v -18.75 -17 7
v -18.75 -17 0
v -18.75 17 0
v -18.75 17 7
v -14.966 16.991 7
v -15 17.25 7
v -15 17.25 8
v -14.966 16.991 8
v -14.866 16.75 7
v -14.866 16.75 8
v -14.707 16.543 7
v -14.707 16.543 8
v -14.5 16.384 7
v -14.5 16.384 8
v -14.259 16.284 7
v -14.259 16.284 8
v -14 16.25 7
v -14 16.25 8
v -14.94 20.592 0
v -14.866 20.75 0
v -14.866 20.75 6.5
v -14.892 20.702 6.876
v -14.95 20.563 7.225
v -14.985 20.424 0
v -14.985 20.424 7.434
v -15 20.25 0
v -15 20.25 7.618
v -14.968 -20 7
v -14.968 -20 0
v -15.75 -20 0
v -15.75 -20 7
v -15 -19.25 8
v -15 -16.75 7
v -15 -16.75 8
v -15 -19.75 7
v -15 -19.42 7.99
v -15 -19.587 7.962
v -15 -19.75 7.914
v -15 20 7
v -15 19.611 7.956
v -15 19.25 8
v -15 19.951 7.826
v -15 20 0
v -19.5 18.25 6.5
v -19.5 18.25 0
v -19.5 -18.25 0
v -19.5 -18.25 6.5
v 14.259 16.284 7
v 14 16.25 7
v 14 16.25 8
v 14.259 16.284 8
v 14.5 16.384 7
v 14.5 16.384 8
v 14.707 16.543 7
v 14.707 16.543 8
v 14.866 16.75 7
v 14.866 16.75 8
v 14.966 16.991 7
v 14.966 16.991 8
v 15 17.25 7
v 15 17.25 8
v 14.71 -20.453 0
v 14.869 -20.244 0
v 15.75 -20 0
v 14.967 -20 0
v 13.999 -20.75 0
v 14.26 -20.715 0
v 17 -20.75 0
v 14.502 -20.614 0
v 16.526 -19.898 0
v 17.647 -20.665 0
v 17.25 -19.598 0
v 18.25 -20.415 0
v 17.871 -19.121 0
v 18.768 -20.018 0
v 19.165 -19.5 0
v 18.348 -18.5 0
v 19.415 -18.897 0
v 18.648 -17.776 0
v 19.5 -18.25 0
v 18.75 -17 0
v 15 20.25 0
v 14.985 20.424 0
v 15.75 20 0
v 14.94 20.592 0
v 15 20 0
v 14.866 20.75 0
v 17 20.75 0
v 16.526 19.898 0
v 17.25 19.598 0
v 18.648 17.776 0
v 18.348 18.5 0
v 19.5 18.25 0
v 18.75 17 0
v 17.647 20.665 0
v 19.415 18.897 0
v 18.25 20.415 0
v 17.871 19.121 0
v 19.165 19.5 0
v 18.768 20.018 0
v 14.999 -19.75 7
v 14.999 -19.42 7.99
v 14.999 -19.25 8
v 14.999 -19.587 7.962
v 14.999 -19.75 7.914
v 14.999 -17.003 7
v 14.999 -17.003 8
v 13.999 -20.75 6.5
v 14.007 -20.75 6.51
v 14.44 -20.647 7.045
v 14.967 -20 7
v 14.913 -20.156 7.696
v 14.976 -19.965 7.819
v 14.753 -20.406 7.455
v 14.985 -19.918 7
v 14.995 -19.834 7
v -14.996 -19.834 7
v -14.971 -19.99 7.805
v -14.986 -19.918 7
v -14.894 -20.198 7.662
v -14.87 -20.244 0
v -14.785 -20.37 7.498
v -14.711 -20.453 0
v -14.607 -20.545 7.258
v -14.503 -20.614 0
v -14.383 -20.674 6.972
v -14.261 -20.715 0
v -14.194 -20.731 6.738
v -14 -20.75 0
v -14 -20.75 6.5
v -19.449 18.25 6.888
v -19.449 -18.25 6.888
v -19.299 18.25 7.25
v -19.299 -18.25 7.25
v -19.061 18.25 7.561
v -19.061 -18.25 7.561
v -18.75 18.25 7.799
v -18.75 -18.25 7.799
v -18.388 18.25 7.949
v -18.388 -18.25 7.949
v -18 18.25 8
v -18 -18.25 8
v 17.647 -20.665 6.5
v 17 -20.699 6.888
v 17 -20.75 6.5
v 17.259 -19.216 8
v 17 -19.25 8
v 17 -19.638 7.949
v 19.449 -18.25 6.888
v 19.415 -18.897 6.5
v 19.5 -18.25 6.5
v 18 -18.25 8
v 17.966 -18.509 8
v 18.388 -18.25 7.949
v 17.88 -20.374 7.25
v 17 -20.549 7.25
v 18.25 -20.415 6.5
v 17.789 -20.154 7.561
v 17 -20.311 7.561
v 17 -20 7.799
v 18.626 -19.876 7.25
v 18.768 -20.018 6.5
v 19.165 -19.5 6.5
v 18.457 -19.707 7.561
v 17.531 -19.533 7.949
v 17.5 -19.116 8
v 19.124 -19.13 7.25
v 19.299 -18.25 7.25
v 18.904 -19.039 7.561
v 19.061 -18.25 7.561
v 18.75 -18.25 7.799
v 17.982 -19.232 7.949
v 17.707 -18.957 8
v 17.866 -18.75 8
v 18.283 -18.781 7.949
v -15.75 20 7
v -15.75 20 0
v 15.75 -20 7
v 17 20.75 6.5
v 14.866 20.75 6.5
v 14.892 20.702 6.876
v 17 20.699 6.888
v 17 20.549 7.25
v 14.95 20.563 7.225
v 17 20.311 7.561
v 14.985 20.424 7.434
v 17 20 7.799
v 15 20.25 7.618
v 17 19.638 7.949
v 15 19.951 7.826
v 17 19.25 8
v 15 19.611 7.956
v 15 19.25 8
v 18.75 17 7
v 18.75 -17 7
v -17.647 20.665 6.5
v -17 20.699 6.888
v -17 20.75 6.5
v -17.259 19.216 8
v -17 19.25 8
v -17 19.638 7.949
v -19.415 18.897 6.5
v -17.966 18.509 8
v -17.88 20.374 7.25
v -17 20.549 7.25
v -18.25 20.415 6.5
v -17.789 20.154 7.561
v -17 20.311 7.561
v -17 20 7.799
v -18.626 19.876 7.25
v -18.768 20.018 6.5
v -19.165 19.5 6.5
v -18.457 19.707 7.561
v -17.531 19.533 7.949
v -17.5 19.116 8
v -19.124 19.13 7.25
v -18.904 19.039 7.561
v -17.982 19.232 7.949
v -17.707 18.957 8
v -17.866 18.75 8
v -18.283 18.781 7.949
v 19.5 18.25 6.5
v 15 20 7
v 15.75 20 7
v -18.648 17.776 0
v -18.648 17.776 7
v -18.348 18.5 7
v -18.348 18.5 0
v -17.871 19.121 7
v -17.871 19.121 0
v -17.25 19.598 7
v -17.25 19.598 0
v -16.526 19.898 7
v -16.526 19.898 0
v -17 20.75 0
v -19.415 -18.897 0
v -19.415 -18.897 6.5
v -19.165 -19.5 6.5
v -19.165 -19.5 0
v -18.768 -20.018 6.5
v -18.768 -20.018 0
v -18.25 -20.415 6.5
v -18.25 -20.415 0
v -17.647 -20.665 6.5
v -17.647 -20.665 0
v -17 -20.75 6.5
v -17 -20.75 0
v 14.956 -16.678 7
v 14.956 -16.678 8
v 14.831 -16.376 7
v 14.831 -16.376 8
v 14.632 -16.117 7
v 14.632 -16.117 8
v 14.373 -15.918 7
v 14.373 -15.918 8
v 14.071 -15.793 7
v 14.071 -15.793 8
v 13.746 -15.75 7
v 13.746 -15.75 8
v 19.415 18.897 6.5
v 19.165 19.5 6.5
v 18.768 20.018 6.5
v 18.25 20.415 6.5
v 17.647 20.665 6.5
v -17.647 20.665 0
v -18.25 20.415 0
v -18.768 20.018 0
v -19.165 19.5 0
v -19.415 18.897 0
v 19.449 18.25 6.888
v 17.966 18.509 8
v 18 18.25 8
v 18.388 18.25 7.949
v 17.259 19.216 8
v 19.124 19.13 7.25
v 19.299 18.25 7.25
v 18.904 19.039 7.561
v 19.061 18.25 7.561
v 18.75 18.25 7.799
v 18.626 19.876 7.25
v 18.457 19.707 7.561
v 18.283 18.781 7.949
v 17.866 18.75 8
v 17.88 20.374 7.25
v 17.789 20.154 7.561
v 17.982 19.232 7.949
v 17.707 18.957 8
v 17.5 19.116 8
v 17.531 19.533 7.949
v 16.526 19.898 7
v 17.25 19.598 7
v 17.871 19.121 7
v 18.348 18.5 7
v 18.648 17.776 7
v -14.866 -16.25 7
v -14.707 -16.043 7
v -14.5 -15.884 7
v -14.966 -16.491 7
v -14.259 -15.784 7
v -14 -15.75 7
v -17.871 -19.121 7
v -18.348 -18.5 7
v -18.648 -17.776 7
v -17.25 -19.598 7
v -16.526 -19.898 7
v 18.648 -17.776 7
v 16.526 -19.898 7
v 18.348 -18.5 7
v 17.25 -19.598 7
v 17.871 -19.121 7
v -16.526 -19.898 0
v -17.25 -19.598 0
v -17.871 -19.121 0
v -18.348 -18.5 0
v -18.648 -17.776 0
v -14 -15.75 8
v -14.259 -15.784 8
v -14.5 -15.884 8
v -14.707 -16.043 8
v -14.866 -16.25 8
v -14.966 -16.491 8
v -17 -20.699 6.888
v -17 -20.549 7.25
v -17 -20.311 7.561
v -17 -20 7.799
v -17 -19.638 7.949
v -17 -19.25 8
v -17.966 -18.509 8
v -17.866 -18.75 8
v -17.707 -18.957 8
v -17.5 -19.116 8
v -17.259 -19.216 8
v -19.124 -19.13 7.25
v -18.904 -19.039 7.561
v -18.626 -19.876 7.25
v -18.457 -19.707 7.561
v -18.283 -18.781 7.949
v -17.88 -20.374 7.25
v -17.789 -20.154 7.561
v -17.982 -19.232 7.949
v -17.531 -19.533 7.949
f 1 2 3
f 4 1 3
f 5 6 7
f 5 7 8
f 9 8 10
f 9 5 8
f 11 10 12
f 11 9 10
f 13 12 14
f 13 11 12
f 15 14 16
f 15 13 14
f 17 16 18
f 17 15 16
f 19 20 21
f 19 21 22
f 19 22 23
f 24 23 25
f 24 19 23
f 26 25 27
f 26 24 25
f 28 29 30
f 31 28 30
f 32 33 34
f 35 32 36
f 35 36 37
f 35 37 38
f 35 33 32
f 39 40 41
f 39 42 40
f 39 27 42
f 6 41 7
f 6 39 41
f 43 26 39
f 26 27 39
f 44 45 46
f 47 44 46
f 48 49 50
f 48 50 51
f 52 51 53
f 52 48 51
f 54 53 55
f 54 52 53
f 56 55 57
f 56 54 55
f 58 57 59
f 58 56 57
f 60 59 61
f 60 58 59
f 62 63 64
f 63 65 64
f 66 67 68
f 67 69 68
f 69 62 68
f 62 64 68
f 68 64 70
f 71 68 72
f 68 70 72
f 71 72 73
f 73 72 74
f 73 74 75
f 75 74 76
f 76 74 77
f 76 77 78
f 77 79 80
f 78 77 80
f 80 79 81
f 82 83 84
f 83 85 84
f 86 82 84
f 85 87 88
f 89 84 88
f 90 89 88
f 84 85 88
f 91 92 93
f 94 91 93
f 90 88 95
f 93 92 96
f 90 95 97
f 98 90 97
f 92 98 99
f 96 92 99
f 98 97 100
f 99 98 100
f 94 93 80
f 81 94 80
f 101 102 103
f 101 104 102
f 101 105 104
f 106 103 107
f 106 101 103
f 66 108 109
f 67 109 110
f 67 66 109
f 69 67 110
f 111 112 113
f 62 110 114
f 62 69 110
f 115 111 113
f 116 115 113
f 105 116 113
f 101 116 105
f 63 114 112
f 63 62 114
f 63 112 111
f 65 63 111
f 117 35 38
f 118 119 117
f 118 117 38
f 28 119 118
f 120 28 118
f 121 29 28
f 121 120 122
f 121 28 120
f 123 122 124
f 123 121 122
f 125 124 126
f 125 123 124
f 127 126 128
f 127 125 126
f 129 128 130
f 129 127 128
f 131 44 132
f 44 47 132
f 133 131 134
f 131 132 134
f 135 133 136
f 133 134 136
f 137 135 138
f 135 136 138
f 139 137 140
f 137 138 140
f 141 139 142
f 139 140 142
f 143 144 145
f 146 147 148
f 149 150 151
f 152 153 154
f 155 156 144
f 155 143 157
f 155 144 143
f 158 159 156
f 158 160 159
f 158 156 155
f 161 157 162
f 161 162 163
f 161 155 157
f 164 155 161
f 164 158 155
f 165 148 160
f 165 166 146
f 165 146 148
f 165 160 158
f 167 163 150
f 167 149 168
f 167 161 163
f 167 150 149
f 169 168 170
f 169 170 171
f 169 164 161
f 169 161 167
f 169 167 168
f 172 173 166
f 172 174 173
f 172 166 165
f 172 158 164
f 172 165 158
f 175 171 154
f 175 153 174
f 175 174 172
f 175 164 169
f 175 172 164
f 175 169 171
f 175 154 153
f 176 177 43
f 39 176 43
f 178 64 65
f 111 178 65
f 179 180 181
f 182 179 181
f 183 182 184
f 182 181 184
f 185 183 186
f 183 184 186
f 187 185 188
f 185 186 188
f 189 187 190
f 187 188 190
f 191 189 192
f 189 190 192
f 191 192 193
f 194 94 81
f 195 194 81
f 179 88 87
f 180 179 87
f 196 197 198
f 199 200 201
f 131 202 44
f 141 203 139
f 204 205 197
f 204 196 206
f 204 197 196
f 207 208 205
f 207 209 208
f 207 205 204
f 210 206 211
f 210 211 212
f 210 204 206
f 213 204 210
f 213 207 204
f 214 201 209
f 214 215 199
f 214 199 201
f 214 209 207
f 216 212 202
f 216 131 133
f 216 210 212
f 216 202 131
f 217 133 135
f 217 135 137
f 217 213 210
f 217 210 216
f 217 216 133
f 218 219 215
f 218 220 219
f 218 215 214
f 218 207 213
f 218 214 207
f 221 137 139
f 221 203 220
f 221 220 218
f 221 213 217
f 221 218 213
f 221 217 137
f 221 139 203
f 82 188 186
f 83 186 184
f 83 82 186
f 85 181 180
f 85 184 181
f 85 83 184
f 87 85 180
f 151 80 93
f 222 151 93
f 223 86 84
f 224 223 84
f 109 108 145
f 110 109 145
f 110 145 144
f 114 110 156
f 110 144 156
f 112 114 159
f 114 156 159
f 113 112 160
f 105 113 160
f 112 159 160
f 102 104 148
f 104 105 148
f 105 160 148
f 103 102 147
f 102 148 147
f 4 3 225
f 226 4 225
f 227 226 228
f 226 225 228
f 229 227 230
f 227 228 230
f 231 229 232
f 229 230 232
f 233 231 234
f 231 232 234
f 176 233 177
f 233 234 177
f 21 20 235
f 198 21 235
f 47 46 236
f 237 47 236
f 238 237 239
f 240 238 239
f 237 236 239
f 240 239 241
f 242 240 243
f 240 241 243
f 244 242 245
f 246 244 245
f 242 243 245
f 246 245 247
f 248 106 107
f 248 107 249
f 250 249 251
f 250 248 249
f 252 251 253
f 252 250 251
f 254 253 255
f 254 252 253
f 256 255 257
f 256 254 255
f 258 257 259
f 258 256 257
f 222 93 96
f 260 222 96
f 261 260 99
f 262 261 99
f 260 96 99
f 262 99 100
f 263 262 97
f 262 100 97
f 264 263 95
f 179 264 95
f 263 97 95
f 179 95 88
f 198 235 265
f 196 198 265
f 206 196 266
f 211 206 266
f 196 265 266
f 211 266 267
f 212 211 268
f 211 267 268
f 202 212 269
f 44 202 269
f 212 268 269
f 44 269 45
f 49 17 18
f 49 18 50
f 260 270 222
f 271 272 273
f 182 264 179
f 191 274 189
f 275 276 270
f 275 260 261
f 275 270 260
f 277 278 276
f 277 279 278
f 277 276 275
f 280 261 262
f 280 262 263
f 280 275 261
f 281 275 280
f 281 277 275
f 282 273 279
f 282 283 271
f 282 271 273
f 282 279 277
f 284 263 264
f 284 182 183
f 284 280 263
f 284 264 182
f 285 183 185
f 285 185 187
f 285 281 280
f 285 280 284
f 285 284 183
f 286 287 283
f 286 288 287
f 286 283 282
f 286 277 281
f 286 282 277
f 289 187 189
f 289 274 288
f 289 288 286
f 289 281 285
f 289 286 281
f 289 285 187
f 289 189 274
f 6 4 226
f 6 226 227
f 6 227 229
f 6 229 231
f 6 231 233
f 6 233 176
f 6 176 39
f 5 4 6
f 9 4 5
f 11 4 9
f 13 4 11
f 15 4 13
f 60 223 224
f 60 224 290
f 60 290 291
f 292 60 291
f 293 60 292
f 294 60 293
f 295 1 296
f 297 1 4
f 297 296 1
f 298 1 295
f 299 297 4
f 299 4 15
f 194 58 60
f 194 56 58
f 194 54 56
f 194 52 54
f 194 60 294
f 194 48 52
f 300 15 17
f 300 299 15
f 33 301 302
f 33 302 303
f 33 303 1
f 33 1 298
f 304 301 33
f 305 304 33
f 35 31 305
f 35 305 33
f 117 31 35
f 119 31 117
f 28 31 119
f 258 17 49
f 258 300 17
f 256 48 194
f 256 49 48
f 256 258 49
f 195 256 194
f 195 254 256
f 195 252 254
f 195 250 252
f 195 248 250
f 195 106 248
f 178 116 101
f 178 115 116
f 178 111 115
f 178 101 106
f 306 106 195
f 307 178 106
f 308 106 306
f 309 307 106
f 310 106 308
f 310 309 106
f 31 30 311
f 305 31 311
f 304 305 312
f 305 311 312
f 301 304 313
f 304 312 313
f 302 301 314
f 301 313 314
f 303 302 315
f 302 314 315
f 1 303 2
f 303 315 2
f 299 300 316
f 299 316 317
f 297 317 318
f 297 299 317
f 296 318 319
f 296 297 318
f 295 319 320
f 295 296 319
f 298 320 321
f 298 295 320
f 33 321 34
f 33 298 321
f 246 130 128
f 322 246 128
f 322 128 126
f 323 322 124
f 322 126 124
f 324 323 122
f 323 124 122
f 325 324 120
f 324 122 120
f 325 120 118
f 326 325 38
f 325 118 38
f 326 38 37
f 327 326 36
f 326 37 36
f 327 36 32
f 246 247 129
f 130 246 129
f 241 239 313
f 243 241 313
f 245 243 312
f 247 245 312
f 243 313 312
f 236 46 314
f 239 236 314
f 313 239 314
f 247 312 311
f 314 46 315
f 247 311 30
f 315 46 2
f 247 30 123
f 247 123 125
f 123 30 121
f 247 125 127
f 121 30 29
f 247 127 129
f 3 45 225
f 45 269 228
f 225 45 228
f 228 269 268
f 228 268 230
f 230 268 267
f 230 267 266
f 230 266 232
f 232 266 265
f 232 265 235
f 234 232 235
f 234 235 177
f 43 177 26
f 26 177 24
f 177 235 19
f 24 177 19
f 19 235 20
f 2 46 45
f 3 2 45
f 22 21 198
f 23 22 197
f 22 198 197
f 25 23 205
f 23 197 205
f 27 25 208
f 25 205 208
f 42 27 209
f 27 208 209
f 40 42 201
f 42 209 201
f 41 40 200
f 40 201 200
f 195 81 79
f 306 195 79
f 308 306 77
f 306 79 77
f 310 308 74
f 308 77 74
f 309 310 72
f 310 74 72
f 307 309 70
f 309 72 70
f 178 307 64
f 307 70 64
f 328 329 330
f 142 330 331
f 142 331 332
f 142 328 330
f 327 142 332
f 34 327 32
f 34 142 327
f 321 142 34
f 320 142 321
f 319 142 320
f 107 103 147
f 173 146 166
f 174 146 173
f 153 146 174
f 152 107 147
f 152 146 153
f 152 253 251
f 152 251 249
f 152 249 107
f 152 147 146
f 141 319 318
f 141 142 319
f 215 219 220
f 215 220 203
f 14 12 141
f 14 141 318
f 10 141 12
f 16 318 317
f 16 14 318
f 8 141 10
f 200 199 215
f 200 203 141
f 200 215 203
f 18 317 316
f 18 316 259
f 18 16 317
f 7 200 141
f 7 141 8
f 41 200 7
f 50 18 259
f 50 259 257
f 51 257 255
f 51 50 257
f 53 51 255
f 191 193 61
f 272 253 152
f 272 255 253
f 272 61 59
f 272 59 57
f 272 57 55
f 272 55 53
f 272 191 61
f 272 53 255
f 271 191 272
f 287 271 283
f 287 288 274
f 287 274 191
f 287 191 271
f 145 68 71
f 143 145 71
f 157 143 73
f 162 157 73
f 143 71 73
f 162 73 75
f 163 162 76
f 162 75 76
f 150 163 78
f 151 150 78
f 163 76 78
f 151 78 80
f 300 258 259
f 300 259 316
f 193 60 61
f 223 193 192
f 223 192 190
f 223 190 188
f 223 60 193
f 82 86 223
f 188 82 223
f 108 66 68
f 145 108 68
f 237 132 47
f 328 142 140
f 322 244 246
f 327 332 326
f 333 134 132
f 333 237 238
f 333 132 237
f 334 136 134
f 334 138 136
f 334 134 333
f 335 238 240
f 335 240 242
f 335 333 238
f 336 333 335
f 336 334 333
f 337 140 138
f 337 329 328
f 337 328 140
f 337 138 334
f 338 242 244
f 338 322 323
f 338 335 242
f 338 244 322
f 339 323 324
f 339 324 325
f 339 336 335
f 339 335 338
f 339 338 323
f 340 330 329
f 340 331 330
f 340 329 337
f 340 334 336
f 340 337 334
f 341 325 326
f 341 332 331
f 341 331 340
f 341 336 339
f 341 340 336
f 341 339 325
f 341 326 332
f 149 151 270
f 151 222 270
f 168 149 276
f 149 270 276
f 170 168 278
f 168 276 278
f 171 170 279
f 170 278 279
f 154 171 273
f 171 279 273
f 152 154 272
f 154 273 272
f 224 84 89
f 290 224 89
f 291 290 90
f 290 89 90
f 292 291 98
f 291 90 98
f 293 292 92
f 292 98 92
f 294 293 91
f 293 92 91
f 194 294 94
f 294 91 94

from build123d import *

# Parameters (mm, degrees)
PAD_DEPTH       = 8
FILLET_R        = 1.5
POCKET_DEPTH    = 7
POCKET001_DEPTH = 10
POCKET002_DEPTH = 10


with BuildPart() as part:
    # Sketch → Pad (new body)
    with BuildSketch(Plane.XY):
        with BuildLine():
            Line((-19.5, 18.25), (-19.5, -18.25))
            ThreePointArc((-19.5, -18.25), (-18.767767, -20.017767), (-17, -20.75))
            Line((-17, -20.75), (17, -20.75))
            ThreePointArc((17, -20.75), (18.767767, -20.017767), (19.5, -18.25))
            Line((19.5, -18.25), (19.5, 18.25))
            ThreePointArc((19.5, 18.25), (18.767767, 20.017767), (17, 20.75))
            Line((17, 20.75), (-17, 20.75))
            ThreePointArc((-17, 20.75), (-18.767767, 20.017767), (-19.5, 18.25))
        make_face()
    extrude(amount=PAD_DEPTH)

    # Fillet
    fillet_edges = [part.edges().sort_by_distance(p)[0] for p in [
        (-19.5, 0, 8),
        (-18.767767, -20.017767, 8),
        (0, -20.75, 8),
        (18.767767, -20.017767, 8),
        (19.5, 0, 8),
        (18.767767, 20.017767, 8),
        (0, 20.75, 8),
        (-18.767767, 20.017767, 8),
    ]]
    fillet(fillet_edges, radius=FILLET_R)

    # Sketch001 (on Face4 of Fillet) → Pocket (cut)
    with BuildSketch(Plane(origin=(0, 0, 0), x_dir=(1, 0, 0), z_dir=(0, 0, -1))):
        with BuildLine():
            Line((-18.75, 17), (-18.75, -17))
            ThreePointArc((-18.75, -17), (-17.87132, -19.12132), (-15.75, -20))
            Line((-15.75, -20), (15.75, -20))
            ThreePointArc((15.75, -20), (17.87132, -19.12132), (18.75, -17))
            Line((18.75, -17), (18.75, 17))
            ThreePointArc((18.75, 17), (17.87132, 19.12132), (15.75, 20))
            Line((15.75, 20), (-15.75, 20))
            ThreePointArc((-15.75, 20), (-17.87132, 19.12132), (-18.75, 17))
        make_face()
    extrude(amount=-POCKET_DEPTH, mode=Mode.SUBTRACT)

    # Sketch003 → Pocket001 (cut)
    with BuildSketch(Plane.XY):
        with BuildLine():
            Line((-15, 20.25), (-15, 17.25))
            ThreePointArc((-15, 17.25), (-14.707107, 16.542893), (-14, 16.25))
            Line((-14, 16.25), (14, 16.25))
            ThreePointArc((14, 16.25), (14.707107, 16.542893), (15, 17.25))
            Line((15, 17.25), (15, 20.25))
            ThreePointArc((15, 20.25), (14.707107, 20.957107), (14, 21.25))
            Line((14, 21.25), (-14, 21.25))
            ThreePointArc((-14, 21.25), (-14.707107, 20.957107), (-15, 20.25))
        make_face()
    extrude(amount=POCKET001_DEPTH, mode=Mode.SUBTRACT)

    # Sketch004 → Pocket002 (cut)
    with BuildSketch(Plane.XY):
        with BuildLine():
            Line((-15, -16.75), (-15, -19.75))
            ThreePointArc((-15, -19.75), (-14.707107, -20.457107), (-14, -20.75))
            Line((-14, -20.75), (13.998937, -20.75))
            ThreePointArc((13.998937, -20.75), (14.706044, -20.457107), (14.998937, -19.75))
            Line((14.998937, -19.75), (14.998937, -17.002513))
            ThreePointArc((14.998937, -17.002513), (14.632085, -16.116853), (13.746424, -15.75))
            Line((13.746424, -15.75), (-14, -15.75))
            ThreePointArc((-14, -15.75), (-14.707107, -16.042893), (-15, -16.75))
        make_face()
    extrude(amount=POCKET002_DEPTH, mode=Mode.SUBTRACT)


solid = part.part
